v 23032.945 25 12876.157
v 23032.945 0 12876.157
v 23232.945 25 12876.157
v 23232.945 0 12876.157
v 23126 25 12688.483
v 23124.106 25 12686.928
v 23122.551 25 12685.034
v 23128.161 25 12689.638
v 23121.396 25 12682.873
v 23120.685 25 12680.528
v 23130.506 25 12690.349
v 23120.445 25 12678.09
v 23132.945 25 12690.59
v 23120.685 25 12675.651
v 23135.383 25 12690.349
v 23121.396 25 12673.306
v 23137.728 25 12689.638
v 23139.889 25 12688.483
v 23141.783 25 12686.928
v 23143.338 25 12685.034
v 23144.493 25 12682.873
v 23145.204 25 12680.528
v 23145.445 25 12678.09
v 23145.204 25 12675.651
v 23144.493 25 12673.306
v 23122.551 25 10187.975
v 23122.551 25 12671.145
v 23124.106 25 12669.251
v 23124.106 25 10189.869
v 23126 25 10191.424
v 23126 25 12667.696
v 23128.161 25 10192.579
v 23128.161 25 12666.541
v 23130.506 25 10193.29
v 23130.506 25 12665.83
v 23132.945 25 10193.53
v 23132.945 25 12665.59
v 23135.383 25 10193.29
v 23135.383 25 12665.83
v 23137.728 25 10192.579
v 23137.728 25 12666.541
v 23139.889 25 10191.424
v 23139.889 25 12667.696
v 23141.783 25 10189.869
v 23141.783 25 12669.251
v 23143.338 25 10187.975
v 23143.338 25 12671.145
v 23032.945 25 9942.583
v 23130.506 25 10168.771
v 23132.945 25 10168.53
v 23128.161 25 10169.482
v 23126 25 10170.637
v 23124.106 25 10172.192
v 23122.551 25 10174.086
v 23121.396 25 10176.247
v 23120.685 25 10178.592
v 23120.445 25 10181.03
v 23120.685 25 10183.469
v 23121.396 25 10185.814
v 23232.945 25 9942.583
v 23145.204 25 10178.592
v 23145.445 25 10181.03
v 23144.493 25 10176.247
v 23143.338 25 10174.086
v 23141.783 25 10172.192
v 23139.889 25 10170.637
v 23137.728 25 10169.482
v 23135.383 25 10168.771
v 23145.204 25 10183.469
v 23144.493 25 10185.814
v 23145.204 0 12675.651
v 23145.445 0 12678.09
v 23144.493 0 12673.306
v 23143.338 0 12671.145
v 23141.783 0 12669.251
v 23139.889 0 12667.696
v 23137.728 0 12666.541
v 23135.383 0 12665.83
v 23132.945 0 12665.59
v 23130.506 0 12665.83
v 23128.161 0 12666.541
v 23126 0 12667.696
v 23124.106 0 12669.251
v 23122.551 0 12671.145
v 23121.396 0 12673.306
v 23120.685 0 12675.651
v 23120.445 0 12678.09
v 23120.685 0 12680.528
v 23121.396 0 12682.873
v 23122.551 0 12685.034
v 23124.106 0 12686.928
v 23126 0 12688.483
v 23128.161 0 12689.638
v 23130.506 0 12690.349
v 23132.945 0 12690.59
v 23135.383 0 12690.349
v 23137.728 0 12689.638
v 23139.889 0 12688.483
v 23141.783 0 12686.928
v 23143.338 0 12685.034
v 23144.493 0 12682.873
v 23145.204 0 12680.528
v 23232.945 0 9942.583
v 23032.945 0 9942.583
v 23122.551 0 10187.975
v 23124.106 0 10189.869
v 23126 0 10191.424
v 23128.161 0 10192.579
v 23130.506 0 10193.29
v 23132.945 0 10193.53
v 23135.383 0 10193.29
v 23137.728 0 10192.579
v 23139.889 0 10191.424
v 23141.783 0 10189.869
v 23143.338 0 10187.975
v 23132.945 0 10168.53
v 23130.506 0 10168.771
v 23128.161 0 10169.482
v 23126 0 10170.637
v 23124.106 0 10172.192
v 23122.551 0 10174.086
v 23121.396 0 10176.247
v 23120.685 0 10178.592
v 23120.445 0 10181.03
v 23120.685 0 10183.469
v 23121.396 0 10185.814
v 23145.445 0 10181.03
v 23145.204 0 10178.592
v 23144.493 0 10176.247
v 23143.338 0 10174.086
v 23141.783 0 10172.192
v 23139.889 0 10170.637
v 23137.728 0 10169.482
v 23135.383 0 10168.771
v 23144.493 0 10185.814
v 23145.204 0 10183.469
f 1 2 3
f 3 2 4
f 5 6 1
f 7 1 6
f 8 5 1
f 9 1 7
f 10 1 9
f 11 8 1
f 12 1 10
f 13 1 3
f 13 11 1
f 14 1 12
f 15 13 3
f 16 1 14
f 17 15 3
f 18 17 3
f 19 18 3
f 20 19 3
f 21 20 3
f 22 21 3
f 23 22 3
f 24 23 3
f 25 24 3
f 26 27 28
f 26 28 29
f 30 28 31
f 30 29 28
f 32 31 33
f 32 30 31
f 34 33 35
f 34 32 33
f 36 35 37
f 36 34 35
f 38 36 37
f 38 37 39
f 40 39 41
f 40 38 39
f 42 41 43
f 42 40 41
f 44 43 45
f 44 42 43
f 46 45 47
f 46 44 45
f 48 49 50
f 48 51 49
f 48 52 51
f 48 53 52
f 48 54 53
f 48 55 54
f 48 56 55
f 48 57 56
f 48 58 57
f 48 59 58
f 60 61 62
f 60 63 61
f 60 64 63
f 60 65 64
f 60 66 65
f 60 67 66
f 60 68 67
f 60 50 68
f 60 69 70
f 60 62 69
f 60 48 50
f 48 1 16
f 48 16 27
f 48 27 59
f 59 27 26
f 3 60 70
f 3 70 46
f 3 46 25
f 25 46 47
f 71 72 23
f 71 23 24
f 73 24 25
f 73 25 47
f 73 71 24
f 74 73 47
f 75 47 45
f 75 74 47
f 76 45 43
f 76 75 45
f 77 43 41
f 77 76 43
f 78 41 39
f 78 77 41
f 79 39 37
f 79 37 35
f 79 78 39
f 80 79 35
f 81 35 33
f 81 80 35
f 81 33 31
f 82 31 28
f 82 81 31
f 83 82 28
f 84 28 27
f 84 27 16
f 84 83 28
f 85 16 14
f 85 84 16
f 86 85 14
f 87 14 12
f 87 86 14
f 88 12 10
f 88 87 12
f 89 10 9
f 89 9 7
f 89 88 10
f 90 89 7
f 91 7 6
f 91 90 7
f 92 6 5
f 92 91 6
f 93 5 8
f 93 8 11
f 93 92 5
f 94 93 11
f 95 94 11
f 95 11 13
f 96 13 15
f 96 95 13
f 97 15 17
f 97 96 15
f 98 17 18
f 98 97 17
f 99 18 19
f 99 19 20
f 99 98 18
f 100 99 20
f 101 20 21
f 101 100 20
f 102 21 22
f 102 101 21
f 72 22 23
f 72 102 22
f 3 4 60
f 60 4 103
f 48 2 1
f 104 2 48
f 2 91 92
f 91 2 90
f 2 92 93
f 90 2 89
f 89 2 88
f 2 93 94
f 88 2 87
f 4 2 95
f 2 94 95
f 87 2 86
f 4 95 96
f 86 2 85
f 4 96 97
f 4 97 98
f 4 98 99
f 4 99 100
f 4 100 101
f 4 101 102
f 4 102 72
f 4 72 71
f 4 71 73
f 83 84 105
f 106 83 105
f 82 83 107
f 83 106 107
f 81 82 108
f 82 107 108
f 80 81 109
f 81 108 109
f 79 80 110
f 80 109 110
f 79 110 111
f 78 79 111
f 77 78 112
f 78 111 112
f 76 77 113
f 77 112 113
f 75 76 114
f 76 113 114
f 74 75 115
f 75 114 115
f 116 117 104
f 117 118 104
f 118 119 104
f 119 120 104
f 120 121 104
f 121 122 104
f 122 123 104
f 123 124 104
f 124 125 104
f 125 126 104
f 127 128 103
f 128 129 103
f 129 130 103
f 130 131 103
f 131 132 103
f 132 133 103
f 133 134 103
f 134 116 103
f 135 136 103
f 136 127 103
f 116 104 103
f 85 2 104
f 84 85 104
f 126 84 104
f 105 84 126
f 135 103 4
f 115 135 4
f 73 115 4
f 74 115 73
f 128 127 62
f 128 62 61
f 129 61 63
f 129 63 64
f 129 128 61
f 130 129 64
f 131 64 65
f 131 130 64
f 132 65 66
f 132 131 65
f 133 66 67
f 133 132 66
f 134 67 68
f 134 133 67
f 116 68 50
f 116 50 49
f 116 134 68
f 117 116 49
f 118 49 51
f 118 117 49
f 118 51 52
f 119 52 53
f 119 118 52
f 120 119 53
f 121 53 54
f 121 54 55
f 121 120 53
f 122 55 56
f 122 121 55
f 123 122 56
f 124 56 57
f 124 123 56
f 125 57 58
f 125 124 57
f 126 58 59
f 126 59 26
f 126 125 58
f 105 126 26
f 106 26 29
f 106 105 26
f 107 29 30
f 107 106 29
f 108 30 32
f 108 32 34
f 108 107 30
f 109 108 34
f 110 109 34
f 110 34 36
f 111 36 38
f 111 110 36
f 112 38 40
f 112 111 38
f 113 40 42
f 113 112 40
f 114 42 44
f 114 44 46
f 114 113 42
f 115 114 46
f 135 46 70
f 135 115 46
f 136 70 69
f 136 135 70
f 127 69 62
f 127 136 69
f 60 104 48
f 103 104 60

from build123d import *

# Parameters (mm, degrees)
SKETCH4_W             = 200
SKETCH4_H             = 2933.573874127
SKETCH4_R             = 12.5
BOSS_EXTRUDE1_DEPTH   = 25
SKETCH4_H_2           = 2891.000919938
BOSS_EXTRUDE1_2_DEPTH = 25
SKETCH4_H_3           = 2656.8496719
BOSS_EXTRUDE1_3_DEPTH = 25
SKETCH4_H_4           = 2167.26069873
BOSS_EXTRUDE1_4_DEPTH = 25
SKETCH4_H_5           = 1693.636583381
BOSS_EXTRUDE1_5_DEPTH = 25
SKETCH5_W             = 5252.2870397
SKETCH5_H             = 5093.660921052
CUT_EXTRUDE3_DEPTH    = 26


with BuildPart() as part:
    # Sketch4 → Boss-Extrude1 (new body)
    with BuildSketch(Plane(origin=(0, 0, 0), x_dir=(1, 0, 0), z_dir=(0, 1, 0))):
        with Locations((23132.944645813, -11409.369811035)):
            Rectangle(SKETCH4_W, SKETCH4_H)
        with Locations((23132.944645813, -12678.089615367)):
            Circle(SKETCH4_R, mode=Mode.SUBTRACT)
        with Locations((23132.944645813, -10181.030459334)):
            Circle(SKETCH4_R, mode=Mode.SUBTRACT)
    extrude(amount=BOSS_EXTRUDE1_DEPTH)


with BuildPart() as body_2:
    # Sketch4 → Boss-Extrude1 2 (new body)
    with BuildSketch(Plane(origin=(0, 0, 0), x_dir=(1, 0, 0), z_dir=(0, 1, 0))):
        with Locations((22032.944645813, -11388.083333941)):
            Rectangle(SKETCH4_W, SKETCH4_H_2)
        with Locations((22032.944645813, -12621.228285175)):
            Circle(SKETCH4_R, mode=Mode.SUBTRACT)
        with Locations((22032.944645813, -10181.030459334)):
            Circle(SKETCH4_R, mode=Mode.SUBTRACT)
    extrude(amount=BOSS_EXTRUDE1_2_DEPTH)


with BuildPart() as body_3:
    # Sketch4 → Boss-Extrude1 3 (new body)
    with BuildSketch(Plane(origin=(0, 0, 0), x_dir=(1, 0, 0), z_dir=(0, 1, 0))):
        with Locations((20832.944645813, -11271.007709922)):
            Rectangle(SKETCH4_W, SKETCH4_H_3)
        with Locations((20832.944645813, -12348.754240871)):
            Circle(SKETCH4_R, mode=Mode.SUBTRACT)
        with Locations((20832.944645813, -10181.030459334)):
            Circle(SKETCH4_R, mode=Mode.SUBTRACT)
    extrude(amount=BOSS_EXTRUDE1_3_DEPTH)


with BuildPart() as body_4:
    # Sketch4 → Boss-Extrude1 4 (new body)
    with BuildSketch(Plane(origin=(0, 0, 0), x_dir=(1, 0, 0), z_dir=(0, 1, 0))):
        with Locations((19632.944645813, -11026.213223337)):
            Rectangle(SKETCH4_W, SKETCH4_H_4)
        with Locations((19632.944645813, -11826.915448153)):
            Circle(SKETCH4_R, mode=Mode.SUBTRACT)
        with Locations((19632.944645813, -10181.030459334)):
            Circle(SKETCH4_R, mode=Mode.SUBTRACT)
    extrude(amount=BOSS_EXTRUDE1_4_DEPTH)


with BuildPart() as body_5:
    # Sketch4 → Boss-Extrude1 5 (new body)
    with BuildSketch(Plane(origin=(0, 0, 0), x_dir=(1, 0, 0), z_dir=(0, 1, 0))):
        with Locations((18802.944645813, -10789.401165663)):
            Rectangle(SKETCH4_W, SKETCH4_H_5)
        with Locations((18802.944645813, -11283.669778774)):
            Circle(SKETCH4_R, mode=Mode.SUBTRACT)
        with Locations((18802.944645813, -10181.030459334)):
            Circle(SKETCH4_R, mode=Mode.SUBTRACT)
    extrude(amount=BOSS_EXTRUDE1_5_DEPTH)


with BuildPart() as cut_extrude3_tool:
    # Sketch5 → Cut-Extrude3 (new body, through all)
    with BuildSketch(Plane(origin=(0, 0, 0), x_dir=(1, 0, 0), z_dir=(0, 1, 0))):
        with Locations((19839.936690978, -11321.244189564)):
            Rectangle(SKETCH5_W, SKETCH5_H)
    extrude(amount=CUT_EXTRUDE3_DEPTH)


with BuildPart() as body_2_1:
    add(body_2.part)

    # Cut-Extrude3: cut by cut_extrude3_tool
    add(cut_extrude3_tool.part, mode=Mode.SUBTRACT)


with BuildPart() as body_3_1:
    add(body_3.part)

    # Cut-Extrude3: cut by cut_extrude3_tool
    add(cut_extrude3_tool.part, mode=Mode.SUBTRACT)


with BuildPart() as body_4_1:
    add(body_4.part)

    # Cut-Extrude3: cut by cut_extrude3_tool
    add(cut_extrude3_tool.part, mode=Mode.SUBTRACT)


with BuildPart() as body_5_1:
    add(body_5.part)

    # Cut-Extrude3: cut by cut_extrude3_tool
    add(cut_extrude3_tool.part, mode=Mode.SUBTRACT)


solid = part.part
